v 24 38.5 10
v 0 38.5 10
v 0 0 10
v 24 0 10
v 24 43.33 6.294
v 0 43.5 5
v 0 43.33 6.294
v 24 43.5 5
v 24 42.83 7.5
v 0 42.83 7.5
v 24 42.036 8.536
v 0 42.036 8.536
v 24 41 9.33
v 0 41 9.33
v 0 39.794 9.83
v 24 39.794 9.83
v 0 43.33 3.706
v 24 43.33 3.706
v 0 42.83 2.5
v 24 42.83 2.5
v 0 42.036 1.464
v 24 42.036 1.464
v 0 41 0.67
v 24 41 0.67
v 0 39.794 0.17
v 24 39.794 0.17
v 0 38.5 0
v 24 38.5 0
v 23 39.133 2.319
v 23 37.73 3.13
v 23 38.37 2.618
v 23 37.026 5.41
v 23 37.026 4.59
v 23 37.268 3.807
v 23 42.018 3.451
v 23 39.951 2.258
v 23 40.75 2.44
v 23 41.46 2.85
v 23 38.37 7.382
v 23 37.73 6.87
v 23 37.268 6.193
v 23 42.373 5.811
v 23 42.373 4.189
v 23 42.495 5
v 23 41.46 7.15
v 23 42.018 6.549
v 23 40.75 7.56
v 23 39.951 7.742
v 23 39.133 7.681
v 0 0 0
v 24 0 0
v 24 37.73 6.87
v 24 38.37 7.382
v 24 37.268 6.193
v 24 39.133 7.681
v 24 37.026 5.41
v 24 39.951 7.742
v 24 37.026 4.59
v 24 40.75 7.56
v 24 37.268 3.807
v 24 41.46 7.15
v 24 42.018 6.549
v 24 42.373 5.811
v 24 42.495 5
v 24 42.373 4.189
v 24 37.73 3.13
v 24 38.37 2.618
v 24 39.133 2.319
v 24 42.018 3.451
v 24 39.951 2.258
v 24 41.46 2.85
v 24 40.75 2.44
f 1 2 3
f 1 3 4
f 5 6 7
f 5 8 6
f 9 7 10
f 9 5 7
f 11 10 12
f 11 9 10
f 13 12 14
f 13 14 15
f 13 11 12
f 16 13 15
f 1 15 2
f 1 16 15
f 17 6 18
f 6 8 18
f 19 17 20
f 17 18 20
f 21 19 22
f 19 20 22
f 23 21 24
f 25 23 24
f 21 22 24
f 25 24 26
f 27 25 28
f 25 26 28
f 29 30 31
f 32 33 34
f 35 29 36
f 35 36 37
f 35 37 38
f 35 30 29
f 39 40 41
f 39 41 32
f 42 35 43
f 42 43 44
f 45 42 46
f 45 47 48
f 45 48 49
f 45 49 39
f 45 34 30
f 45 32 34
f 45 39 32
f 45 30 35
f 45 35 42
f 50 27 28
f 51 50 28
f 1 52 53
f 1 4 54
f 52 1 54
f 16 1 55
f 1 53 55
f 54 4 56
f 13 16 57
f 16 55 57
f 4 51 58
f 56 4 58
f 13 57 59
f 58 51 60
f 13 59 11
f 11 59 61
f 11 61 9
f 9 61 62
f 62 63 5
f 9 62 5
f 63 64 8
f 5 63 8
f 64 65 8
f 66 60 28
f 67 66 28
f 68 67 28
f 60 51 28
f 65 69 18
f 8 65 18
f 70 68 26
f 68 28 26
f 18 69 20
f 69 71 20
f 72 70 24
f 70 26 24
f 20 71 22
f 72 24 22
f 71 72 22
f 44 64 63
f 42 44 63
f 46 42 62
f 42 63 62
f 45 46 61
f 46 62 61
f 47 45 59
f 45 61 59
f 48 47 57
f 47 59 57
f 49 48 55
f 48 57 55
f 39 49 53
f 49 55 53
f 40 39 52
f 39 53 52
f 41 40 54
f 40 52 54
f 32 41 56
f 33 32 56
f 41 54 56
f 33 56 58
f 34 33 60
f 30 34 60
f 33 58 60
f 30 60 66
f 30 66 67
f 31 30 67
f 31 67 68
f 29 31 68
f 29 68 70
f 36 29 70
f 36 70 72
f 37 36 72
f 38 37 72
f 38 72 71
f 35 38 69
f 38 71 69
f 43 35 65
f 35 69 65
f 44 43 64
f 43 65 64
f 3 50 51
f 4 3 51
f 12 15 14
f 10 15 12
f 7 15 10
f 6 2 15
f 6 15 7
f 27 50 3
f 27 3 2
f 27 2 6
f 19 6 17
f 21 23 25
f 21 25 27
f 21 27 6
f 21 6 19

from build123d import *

# Parameters (mm, degrees)
SKETCH1_W           = 24
SKETCH1_H           = 43.5
BOSS_EXTRUDE1_DEPTH = 10
FILLET1_R           = 5
SKETCH2_R           = 2.75
CUT_EXTRUDE1_DEPTH  = 1


with BuildPart() as part:
    # Sketch1 → Boss-Extrude1 (new body)
    with BuildSketch(Plane.XY):
        with Locations((12, 21.75)):
            Rectangle(SKETCH1_W, SKETCH1_H)
    extrude(amount=BOSS_EXTRUDE1_DEPTH)

    # Fillet1
    fillet1_edges = [part.edges().sort_by_distance(p)[0] for p in [
        (12, 43.5, 0),
        (12, 43.5, 10),
    ]]
    fillet(fillet1_edges, radius=FILLET1_R - 0.0001)  # a hair under: the kernel refuses the full size

    # Sketch2 → Cut-Extrude1 (cut)
    with BuildSketch(Plane(origin=(24, 0, 0), x_dir=(0, 0, -1), z_dir=(1, 0, 0))):
        with Locations(Location((-5, 39.745423447, 0), (0, 0, 90))):
            Circle(SKETCH2_R)
    extrude(amount=-CUT_EXTRUDE1_DEPTH, mode=Mode.SUBTRACT)


solid = part.part
